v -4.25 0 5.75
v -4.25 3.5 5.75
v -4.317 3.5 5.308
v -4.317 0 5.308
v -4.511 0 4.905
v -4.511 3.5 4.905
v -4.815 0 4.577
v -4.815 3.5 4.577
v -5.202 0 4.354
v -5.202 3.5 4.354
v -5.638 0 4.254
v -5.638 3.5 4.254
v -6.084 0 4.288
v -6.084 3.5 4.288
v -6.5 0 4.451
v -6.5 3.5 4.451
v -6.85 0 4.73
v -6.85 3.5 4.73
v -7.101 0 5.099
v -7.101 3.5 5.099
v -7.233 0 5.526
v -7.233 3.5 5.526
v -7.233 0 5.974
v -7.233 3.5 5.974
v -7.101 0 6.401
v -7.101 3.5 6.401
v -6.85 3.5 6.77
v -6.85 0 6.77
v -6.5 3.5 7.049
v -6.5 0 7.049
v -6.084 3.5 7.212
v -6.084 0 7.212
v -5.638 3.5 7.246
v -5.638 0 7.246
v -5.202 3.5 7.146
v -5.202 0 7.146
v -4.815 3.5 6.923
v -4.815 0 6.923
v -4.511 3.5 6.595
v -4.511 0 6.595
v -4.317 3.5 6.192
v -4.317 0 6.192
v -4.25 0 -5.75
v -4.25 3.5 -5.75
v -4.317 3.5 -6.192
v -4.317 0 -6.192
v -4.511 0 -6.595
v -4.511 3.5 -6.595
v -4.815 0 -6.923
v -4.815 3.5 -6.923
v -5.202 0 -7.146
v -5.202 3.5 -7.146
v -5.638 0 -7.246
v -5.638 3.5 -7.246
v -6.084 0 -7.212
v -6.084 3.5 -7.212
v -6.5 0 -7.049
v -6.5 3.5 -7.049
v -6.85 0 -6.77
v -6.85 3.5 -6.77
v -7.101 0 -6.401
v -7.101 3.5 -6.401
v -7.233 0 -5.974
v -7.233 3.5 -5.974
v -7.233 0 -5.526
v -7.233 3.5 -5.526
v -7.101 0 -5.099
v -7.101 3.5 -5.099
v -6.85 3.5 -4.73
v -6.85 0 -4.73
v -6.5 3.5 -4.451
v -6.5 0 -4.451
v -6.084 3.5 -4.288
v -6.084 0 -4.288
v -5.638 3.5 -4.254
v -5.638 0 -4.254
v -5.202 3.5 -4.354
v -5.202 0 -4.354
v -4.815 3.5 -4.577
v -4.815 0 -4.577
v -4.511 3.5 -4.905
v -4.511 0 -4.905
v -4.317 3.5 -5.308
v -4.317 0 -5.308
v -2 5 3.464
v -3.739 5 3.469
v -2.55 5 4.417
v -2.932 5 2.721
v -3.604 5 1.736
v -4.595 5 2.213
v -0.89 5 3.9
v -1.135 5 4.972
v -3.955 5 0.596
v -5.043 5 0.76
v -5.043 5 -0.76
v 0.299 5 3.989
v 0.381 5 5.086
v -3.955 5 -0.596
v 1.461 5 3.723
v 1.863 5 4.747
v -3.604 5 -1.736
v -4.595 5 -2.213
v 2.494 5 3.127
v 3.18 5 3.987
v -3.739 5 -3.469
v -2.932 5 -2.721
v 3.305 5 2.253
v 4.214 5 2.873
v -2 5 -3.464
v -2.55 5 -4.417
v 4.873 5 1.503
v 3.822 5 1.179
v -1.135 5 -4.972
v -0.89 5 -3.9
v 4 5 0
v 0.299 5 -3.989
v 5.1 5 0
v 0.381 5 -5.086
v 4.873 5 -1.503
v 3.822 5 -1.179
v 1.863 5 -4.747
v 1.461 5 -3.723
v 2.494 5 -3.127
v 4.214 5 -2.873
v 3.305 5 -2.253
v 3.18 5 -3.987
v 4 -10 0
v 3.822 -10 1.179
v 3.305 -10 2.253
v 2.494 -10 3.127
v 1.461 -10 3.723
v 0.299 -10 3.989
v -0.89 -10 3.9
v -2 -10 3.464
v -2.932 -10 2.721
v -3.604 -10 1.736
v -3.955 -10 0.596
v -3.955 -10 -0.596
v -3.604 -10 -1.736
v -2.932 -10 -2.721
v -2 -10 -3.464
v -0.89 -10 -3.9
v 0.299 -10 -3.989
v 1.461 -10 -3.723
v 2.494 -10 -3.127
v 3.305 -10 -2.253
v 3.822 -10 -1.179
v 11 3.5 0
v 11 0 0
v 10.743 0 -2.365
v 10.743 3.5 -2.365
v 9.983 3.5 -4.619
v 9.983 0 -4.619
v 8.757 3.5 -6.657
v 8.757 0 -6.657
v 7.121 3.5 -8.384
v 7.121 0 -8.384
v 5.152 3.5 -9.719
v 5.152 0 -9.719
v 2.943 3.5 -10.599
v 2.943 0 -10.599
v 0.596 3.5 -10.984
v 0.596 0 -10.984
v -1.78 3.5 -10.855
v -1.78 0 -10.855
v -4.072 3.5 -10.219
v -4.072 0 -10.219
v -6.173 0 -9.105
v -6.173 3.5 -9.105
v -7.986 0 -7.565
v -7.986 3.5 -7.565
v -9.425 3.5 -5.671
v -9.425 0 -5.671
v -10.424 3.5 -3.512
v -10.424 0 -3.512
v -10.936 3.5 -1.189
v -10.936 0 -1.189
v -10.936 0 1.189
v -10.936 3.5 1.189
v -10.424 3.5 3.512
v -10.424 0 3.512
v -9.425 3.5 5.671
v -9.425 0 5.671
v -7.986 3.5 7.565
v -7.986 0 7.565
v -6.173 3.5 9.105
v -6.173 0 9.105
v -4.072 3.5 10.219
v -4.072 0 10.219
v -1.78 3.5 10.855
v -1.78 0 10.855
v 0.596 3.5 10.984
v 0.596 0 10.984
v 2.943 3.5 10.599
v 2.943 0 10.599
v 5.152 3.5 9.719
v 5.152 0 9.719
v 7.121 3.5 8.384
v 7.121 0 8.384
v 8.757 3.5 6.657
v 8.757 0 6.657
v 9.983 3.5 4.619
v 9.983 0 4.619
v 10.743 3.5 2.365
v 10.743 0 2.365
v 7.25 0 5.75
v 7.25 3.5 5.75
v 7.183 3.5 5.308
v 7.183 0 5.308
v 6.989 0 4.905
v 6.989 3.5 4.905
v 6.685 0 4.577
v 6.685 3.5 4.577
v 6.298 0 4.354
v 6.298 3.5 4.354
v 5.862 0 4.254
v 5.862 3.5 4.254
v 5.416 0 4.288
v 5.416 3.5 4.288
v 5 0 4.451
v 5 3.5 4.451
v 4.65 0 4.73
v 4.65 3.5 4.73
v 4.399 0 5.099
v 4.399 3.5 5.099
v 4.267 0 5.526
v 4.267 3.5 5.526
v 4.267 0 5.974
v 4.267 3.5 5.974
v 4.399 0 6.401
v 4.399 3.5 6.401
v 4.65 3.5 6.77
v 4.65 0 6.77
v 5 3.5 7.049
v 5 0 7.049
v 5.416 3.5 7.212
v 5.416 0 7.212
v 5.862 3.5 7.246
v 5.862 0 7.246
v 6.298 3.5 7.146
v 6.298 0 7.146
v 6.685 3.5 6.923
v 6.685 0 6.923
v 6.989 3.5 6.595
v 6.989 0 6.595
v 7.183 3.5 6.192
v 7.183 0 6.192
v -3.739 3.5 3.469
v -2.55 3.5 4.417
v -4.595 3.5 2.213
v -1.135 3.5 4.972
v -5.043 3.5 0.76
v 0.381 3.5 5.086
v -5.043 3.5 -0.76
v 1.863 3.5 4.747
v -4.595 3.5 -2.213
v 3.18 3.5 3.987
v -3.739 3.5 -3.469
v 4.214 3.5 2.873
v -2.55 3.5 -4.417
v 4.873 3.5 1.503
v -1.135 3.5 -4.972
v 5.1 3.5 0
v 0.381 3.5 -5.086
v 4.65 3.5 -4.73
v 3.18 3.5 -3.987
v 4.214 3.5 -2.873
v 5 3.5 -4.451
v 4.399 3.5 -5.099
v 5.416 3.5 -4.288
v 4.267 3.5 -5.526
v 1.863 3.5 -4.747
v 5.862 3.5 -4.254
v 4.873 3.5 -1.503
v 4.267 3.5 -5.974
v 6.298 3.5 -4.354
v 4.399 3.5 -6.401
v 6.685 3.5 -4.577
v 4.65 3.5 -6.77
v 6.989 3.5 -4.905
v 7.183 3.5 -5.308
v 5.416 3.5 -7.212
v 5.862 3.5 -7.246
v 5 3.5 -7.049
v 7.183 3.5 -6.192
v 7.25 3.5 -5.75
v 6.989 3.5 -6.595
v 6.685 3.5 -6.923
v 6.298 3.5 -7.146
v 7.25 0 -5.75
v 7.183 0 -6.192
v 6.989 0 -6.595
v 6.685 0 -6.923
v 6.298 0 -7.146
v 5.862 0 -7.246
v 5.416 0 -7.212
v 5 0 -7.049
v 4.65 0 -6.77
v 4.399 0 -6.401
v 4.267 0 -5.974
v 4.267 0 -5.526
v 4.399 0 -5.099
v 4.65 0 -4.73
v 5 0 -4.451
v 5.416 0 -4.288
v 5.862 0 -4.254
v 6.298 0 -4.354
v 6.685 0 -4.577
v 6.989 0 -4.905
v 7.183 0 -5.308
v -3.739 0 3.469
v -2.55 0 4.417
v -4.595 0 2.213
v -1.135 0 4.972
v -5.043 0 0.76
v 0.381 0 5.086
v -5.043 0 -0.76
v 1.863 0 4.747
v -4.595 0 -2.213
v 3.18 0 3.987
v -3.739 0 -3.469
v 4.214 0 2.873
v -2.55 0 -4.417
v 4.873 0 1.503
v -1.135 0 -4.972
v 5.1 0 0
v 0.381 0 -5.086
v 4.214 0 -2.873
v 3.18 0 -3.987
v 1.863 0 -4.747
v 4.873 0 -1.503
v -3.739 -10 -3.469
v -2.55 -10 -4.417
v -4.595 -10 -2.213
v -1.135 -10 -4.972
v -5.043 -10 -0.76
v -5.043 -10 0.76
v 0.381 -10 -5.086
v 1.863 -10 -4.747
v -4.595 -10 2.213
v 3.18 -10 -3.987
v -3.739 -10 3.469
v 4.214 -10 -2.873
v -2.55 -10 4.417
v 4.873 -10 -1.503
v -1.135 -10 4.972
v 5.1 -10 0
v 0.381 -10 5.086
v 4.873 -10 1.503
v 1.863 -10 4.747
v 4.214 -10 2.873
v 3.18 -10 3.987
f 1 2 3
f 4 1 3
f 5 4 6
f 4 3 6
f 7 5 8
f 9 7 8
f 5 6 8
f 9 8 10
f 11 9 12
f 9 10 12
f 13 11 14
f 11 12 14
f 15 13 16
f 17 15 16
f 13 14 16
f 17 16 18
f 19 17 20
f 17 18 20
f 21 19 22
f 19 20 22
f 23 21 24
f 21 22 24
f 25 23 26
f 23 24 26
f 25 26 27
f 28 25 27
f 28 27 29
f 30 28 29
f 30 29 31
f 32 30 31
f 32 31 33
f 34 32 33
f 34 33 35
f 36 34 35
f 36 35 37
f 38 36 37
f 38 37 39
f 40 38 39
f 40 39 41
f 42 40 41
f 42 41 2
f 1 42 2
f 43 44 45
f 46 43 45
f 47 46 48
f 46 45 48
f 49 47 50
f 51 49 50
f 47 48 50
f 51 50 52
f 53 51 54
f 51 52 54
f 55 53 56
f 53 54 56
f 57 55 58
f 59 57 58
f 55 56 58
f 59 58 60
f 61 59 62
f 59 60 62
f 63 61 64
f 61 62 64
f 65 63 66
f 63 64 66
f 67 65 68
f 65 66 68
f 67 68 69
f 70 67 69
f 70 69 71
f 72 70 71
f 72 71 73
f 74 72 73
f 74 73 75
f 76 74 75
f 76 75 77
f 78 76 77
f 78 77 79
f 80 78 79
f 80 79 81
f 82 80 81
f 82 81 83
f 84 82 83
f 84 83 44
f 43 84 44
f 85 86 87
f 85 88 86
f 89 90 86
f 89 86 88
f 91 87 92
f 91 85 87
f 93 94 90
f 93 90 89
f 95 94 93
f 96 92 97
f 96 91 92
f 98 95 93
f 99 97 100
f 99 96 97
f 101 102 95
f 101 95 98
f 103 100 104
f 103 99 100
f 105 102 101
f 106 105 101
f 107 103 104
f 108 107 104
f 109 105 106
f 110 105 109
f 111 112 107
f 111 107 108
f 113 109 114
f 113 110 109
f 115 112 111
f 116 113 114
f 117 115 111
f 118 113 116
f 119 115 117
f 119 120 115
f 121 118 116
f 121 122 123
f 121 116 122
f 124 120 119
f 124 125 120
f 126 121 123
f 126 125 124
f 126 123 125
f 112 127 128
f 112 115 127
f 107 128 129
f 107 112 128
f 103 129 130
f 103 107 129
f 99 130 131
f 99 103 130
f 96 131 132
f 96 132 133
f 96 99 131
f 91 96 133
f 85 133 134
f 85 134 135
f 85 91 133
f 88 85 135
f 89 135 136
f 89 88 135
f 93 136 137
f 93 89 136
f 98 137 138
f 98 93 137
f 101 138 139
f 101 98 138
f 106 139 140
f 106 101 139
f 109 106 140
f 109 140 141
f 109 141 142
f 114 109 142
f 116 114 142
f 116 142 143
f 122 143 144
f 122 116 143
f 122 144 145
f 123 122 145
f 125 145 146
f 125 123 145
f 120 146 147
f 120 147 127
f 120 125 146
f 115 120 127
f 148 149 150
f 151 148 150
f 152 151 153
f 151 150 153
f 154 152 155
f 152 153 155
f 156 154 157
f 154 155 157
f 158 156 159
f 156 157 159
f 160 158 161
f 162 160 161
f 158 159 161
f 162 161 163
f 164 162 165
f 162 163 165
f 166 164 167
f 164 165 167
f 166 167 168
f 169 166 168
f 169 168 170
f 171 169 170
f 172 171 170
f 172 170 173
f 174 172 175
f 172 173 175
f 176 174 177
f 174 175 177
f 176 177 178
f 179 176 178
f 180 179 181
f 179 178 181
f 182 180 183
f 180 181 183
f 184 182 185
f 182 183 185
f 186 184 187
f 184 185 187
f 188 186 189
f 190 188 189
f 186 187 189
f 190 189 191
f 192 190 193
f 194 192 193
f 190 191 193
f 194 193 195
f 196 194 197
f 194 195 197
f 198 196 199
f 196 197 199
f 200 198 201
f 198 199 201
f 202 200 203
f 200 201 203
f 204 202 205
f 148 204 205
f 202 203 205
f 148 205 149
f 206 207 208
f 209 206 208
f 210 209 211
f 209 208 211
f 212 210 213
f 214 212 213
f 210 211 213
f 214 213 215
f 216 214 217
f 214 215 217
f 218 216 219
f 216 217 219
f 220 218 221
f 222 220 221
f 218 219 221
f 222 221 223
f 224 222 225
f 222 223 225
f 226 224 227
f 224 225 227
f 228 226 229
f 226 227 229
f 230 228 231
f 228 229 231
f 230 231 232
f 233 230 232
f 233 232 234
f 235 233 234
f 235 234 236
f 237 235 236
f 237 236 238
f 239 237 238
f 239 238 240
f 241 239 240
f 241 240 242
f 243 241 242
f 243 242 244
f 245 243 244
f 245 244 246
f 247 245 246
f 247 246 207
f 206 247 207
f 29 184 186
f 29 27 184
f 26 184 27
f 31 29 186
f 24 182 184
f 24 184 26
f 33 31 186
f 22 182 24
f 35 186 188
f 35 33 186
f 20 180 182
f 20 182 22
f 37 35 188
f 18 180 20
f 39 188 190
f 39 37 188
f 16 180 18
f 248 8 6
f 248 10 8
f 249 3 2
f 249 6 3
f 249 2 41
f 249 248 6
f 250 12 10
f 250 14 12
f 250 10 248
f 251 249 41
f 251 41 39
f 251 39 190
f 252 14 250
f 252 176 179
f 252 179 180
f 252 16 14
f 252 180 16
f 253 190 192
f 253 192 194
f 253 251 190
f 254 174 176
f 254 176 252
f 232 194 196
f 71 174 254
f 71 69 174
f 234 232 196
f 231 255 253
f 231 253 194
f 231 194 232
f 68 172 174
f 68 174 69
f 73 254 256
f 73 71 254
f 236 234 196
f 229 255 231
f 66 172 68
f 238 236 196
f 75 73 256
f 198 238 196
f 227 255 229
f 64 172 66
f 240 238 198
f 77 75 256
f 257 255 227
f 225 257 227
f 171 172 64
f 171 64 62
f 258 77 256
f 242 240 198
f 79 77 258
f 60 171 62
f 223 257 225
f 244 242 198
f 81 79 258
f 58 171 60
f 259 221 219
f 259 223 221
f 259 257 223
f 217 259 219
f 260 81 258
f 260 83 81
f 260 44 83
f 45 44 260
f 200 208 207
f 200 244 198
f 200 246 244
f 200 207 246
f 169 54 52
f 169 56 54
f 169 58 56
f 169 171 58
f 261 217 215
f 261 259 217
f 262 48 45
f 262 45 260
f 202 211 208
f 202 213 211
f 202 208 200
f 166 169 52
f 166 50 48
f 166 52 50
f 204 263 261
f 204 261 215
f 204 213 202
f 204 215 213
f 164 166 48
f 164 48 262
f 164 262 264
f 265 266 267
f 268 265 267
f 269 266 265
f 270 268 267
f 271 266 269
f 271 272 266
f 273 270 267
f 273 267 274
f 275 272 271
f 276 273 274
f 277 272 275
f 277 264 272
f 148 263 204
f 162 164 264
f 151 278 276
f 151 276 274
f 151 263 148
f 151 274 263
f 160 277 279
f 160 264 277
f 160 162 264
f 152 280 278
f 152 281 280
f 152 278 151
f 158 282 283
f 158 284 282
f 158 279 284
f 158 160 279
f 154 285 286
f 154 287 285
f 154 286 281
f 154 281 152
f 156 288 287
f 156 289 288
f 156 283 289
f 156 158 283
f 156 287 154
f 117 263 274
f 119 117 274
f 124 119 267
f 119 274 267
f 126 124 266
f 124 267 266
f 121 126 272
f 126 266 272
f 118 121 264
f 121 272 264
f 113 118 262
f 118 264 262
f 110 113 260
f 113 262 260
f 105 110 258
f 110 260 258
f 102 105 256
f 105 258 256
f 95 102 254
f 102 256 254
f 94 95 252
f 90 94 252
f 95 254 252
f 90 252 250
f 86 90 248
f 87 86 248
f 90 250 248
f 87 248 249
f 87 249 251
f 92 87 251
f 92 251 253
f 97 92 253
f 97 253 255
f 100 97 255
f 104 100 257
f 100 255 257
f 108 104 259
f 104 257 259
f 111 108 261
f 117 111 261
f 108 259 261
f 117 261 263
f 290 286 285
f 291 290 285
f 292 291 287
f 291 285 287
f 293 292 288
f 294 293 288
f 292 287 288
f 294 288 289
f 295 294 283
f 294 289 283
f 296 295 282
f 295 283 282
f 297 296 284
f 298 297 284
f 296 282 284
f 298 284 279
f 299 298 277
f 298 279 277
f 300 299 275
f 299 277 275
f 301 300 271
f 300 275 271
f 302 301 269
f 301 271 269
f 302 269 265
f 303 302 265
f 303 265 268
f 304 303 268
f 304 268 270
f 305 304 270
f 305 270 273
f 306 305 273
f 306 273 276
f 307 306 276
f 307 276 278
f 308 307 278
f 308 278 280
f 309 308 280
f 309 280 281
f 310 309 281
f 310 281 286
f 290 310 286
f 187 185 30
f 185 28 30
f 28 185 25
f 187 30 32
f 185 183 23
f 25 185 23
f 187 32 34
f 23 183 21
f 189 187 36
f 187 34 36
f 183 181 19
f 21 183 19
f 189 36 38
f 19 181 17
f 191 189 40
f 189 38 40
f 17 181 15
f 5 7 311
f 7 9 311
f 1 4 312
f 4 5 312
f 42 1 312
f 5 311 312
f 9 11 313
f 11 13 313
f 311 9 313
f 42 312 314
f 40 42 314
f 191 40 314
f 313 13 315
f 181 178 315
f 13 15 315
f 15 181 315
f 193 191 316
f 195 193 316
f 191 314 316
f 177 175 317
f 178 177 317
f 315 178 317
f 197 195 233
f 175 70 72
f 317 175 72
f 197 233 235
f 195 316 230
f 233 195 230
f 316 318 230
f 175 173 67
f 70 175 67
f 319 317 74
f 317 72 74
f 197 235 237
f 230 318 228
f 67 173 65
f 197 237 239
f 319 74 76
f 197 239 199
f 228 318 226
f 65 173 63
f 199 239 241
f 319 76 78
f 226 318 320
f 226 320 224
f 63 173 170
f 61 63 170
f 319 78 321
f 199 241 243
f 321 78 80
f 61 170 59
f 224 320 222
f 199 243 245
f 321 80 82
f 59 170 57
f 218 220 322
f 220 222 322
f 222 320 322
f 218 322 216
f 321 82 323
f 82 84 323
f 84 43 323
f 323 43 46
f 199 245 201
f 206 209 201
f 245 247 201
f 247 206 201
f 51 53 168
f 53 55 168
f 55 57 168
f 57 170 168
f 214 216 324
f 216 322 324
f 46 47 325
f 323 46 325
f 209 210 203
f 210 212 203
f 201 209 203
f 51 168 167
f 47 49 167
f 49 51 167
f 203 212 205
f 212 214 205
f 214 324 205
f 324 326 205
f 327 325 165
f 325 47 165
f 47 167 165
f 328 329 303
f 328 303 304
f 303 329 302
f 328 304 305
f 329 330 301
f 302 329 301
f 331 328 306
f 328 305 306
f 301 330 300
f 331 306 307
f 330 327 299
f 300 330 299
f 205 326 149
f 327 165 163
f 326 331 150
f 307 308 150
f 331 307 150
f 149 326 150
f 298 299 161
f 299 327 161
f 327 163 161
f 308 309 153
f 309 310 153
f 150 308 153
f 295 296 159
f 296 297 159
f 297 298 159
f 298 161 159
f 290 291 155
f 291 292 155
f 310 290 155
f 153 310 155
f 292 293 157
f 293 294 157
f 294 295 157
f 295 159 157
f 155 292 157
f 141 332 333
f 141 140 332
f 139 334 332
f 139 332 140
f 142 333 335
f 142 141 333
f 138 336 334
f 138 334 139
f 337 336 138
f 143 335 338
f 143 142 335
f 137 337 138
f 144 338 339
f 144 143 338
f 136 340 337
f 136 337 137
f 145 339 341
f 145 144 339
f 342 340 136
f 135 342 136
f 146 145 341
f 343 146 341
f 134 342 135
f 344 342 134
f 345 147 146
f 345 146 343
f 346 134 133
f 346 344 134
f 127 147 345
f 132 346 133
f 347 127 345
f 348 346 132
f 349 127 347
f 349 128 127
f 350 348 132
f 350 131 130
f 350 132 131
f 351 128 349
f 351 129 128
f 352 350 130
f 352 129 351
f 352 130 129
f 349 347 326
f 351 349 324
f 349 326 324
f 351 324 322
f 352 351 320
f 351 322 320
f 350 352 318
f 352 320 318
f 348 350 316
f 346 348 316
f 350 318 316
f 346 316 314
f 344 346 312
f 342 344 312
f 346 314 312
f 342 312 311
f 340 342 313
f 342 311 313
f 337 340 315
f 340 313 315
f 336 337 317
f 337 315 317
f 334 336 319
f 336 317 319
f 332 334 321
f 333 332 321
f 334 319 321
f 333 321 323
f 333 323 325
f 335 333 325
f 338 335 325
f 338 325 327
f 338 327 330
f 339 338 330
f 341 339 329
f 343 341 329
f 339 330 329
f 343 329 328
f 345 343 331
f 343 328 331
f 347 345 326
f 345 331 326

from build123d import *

# Parameters (mm, degrees)
SKETCH1_R           = 11
SKETCH1_R_2         = 4
BOSS_EXTRUDE1_DEPTH = 3.5
SKETCH2_R           = 5.1
SKETCH2_R_2         = 4
BOSS_EXTRUDE2_DEPTH = 1.5
SKETCH3_R           = 5.1
SKETCH3_R_2         = 4
BOSS_EXTRUDE3_DEPTH = 10
CUT_EXTRUDE1_REACH  = 15.5
SKETCH4_R           = 1.5


with BuildPart() as part:
    # Sketch1 → Boss-Extrude1 (new body)
    with BuildSketch(Plane(origin=(0, 0, 0), x_dir=(1, 0, 0), z_dir=(0, 1, 0))):
        Circle(SKETCH1_R)
        Circle(SKETCH1_R_2, mode=Mode.SUBTRACT)
    extrude(amount=BOSS_EXTRUDE1_DEPTH)

    # Sketch2 → Boss-Extrude2 (add)
    with BuildSketch(Plane(origin=(0, 3.5, 0), x_dir=(1, 0, 0), z_dir=(0, 1, 0))):
        Circle(SKETCH2_R)
        Circle(SKETCH2_R_2, mode=Mode.SUBTRACT)
    extrude(amount=BOSS_EXTRUDE2_DEPTH)

    # Sketch3 → Boss-Extrude3 (add)
    with BuildSketch(Plane.XZ):
        Circle(SKETCH3_R)
        Circle(SKETCH3_R_2, mode=Mode.SUBTRACT)
    extrude(amount=BOSS_EXTRUDE3_DEPTH)

    # Sketch4 → Cut-Extrude1 (cut, up to next)
    with BuildSketch(Plane(origin=(0, 3.5, 0), x_dir=(1, 0, 0), z_dir=(0, 1, 0)), mode=Mode.PRIVATE) as cut_extrude1_sk1:
        with Locations((-5.75, 5.75)):
            Circle(SKETCH4_R)
    cut_extrude1_tool1 = extrude(cut_extrude1_sk1.sketch, amount=-CUT_EXTRUDE1_REACH, mode=Mode.PRIVATE) & part.part
    add(cut_extrude1_tool1.solids().sort_by_distance((-5.75, 3.5, -5.75))[0], mode=Mode.SUBTRACT)
    # Sketch4 → Cut-Extrude1 (cut, up to next)
    with BuildSketch(Plane(origin=(0, 3.5, 0), x_dir=(1, 0, 0), z_dir=(0, 1, 0)), mode=Mode.PRIVATE) as cut_extrude1_sk2:
        with Locations((5.75, 5.75)):
            Circle(SKETCH4_R)
    cut_extrude1_tool2 = extrude(cut_extrude1_sk2.sketch, amount=-CUT_EXTRUDE1_REACH, mode=Mode.PRIVATE) & part.part
    add(cut_extrude1_tool2.solids().sort_by_distance((5.75, 3.5, -5.75))[0], mode=Mode.SUBTRACT)
    # Sketch4 → Cut-Extrude1 (cut, up to next)
    with BuildSketch(Plane(origin=(0, 3.5, 0), x_dir=(1, 0, 0), z_dir=(0, 1, 0)), mode=Mode.PRIVATE) as cut_extrude1_sk3:
        with Locations((5.75, -5.75)):
            Circle(SKETCH4_R)
    cut_extrude1_tool3 = extrude(cut_extrude1_sk3.sketch, amount=-CUT_EXTRUDE1_REACH, mode=Mode.PRIVATE) & part.part
    add(cut_extrude1_tool3.solids().sort_by_distance((5.75, 3.5, 5.75))[0], mode=Mode.SUBTRACT)
    # Sketch4 → Cut-Extrude1 (cut, up to next)
    with BuildSketch(Plane(origin=(0, 3.5, 0), x_dir=(1, 0, 0), z_dir=(0, 1, 0)), mode=Mode.PRIVATE) as cut_extrude1_sk4:
        with Locations((-5.75, -5.75)):
            Circle(SKETCH4_R)
    cut_extrude1_tool4 = extrude(cut_extrude1_sk4.sketch, amount=-CUT_EXTRUDE1_REACH, mode=Mode.PRIVATE) & part.part
    add(cut_extrude1_tool4.solids().sort_by_distance((-5.75, 3.5, 5.75))[0], mode=Mode.SUBTRACT)


solid = part.part
